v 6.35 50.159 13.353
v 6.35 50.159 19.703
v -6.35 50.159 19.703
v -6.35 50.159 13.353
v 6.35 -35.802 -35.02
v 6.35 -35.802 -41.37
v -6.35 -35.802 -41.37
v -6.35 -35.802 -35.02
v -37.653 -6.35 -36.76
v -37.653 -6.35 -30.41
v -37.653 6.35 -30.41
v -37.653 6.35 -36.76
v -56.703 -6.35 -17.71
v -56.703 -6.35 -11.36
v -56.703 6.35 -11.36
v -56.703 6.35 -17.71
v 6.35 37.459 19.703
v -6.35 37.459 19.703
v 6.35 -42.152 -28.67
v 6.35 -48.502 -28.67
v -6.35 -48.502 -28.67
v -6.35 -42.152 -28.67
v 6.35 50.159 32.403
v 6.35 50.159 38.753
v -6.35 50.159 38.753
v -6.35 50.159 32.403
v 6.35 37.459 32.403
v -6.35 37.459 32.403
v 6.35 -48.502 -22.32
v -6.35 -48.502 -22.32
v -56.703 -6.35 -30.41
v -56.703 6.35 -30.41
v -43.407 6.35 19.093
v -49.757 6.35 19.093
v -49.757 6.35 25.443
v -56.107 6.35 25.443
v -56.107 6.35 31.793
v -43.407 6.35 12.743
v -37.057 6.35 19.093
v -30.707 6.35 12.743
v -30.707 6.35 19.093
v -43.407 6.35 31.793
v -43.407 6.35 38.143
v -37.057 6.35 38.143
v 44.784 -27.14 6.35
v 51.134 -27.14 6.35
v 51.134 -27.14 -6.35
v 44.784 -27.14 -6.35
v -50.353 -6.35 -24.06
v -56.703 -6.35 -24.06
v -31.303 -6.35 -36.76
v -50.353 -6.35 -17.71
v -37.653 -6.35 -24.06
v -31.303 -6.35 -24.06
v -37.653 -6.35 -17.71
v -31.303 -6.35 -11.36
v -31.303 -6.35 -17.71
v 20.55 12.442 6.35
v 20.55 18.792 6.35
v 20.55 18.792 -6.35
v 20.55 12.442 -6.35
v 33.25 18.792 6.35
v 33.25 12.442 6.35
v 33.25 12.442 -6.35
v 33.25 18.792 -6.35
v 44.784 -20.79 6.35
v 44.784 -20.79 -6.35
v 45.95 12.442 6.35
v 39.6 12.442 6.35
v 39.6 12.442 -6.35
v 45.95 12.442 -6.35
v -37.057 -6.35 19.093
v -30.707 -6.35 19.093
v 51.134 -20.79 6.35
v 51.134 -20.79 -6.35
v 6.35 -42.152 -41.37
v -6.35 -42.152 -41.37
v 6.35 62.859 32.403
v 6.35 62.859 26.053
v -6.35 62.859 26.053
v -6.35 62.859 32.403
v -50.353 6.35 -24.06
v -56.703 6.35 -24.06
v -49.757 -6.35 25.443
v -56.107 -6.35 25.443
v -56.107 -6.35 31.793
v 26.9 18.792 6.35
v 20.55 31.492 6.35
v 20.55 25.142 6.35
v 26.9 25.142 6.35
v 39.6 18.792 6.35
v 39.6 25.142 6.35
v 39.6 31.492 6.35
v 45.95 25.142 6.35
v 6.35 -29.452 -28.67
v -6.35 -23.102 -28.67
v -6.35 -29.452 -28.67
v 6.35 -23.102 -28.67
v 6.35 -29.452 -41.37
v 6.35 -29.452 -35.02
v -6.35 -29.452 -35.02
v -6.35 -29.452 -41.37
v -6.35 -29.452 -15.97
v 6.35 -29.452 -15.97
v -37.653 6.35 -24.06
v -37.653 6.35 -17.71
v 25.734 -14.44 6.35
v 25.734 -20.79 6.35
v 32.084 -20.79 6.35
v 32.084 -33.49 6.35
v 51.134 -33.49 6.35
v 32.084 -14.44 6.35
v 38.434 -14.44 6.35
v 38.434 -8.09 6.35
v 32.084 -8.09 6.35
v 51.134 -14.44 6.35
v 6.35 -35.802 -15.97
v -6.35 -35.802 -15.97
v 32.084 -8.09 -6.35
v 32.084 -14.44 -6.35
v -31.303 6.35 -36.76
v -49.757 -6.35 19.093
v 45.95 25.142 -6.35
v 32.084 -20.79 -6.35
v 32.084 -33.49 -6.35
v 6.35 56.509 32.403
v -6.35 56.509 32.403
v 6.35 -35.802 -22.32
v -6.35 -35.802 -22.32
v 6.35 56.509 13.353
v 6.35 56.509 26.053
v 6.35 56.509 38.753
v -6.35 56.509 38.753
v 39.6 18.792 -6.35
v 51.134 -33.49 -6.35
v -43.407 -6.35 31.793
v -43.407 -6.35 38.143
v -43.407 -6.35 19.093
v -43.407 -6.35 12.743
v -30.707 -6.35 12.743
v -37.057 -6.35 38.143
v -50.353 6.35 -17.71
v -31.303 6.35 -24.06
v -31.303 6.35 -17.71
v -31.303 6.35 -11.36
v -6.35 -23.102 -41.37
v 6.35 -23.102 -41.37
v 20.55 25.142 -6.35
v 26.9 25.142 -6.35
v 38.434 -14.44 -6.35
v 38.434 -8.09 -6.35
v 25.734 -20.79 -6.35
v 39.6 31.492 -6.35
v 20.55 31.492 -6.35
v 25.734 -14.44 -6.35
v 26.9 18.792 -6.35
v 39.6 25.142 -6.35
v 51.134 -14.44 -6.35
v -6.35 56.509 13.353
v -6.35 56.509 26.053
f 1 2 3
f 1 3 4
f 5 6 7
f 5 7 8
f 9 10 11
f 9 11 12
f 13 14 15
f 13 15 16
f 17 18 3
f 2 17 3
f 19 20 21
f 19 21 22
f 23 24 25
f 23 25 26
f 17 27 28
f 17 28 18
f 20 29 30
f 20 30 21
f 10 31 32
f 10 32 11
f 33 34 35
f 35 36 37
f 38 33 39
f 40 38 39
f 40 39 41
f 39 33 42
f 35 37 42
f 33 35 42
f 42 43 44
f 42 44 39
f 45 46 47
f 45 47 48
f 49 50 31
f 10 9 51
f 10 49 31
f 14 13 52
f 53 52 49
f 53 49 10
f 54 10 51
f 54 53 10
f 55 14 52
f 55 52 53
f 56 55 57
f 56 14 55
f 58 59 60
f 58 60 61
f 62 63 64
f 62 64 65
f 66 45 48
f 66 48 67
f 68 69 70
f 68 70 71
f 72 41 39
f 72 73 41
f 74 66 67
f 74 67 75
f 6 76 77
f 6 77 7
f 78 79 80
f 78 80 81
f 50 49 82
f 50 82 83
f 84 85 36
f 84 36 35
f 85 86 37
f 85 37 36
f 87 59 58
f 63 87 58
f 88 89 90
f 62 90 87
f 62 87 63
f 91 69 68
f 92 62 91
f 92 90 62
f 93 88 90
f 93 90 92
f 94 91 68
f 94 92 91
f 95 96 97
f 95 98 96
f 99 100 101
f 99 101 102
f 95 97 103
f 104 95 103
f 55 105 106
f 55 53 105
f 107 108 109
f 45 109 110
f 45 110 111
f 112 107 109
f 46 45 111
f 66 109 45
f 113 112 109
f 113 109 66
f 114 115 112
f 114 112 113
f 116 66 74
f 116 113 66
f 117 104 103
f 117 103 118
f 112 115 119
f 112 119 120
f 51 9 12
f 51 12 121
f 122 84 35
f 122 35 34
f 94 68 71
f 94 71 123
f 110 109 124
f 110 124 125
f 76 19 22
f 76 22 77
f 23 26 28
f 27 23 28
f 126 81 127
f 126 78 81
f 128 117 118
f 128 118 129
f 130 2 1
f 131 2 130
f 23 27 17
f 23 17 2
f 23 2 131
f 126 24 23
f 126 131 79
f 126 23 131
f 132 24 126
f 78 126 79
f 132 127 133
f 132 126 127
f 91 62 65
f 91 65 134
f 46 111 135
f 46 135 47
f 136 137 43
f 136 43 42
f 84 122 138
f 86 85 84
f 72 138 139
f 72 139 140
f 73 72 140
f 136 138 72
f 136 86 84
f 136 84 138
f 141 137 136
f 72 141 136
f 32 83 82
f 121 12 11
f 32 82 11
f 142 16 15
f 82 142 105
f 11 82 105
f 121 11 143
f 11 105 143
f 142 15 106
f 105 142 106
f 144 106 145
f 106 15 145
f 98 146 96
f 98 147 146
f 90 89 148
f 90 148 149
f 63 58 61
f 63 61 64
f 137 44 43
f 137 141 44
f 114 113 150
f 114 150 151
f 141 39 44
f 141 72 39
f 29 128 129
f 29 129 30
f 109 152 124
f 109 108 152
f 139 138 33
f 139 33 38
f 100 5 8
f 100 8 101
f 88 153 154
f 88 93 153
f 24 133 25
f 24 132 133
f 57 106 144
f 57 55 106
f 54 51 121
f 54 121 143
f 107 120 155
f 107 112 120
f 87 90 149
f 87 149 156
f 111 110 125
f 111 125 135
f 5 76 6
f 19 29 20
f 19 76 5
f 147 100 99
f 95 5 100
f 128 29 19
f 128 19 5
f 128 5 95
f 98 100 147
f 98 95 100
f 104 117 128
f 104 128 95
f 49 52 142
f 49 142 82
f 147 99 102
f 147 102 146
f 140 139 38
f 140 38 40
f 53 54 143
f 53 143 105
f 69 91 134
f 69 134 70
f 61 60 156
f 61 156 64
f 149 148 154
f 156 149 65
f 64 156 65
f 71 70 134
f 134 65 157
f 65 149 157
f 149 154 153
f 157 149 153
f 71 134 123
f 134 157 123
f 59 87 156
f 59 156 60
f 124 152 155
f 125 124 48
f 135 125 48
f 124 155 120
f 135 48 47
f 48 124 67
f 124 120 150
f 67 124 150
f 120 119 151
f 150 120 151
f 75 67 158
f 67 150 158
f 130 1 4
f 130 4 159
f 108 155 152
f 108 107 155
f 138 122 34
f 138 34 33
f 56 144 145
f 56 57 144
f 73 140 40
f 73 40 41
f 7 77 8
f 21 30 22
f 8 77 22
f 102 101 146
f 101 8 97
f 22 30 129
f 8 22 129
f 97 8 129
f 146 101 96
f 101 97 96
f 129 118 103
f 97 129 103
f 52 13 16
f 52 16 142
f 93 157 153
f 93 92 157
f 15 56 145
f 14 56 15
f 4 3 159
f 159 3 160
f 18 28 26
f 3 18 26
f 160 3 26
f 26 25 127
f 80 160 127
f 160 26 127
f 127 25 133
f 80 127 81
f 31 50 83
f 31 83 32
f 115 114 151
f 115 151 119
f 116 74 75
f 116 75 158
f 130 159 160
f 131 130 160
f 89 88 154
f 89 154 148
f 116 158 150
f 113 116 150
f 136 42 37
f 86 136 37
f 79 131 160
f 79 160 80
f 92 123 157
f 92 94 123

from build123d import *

# Parameters (mm, degrees)
F1_DEPTH  = 6.35
F3_DEPTH  = 6.35
F5_DEPTH  = 6.35
F7_DEPTH  = 6.35
F9_DEPTH  = 6.35
F11_DEPTH = 6.35


with BuildPart() as f1:
    # F0 (on Front) → F1 (new body, symmetric)
    with BuildSketch(Plane.XZ):
        Polygon((-37.056787, 38.143132), (-43.406787, 38.143132), (-43.406787, 31.793132), (-56.106787, 31.793132), (-56.106787, 25.443132), (-49.756787, 25.443132), (-49.756787, 19.093132), (-43.406787, 19.093132), (-43.406787, 12.743132), (-30.706787, 12.743132), (-30.706787, 19.093132), (-37.056787, 19.093132), align=None)
    extrude(amount=F1_DEPTH, both=True)


with BuildPart() as f3:
    # F2 (on Top) → F3 (new body, symmetric)
    with BuildSketch(Plane.XY):
        Polygon((39.600315, 31.492337), (20.550315, 31.492337), (20.550315, 25.142337), (26.900315, 25.142337), (26.900315, 18.792337), (20.550315, 18.792337), (20.550315, 12.442337), (33.250316, 12.442337), (33.250316, 18.792337), (39.600316, 18.792337), (39.600316, 12.442337), (45.950315, 12.442337), (45.950315, 25.142337), (39.600315, 25.142337), align=None)
    extrude(amount=F3_DEPTH, both=True)


with BuildPart() as f5:
    # F4 (on Right) → F5 (new body, symmetric)
    with BuildSketch(Plane.YZ):
        Polygon((56.508505, 38.753134), (50.158505, 38.753134), (50.158505, 32.403134), (37.458505, 32.403134), (37.458505, 19.703134), (50.158505, 19.703134), (50.158505, 13.353134), (56.508505, 13.353134), (56.508505, 26.053134), (62.858505, 26.053134), (62.858505, 32.403134), (56.508505, 32.403134), align=None)
    extrude(amount=F5_DEPTH, both=True)


with BuildPart() as f7:
    # F6 (on Front) → F7 (new body, symmetric)
    with BuildSketch(Plane.XZ):
        Polygon((-31.302583, -17.709987), (-31.302583, -11.359987), (-56.702583, -11.359987), (-56.702583, -17.709987), (-50.352583, -17.709987), (-50.352583, -24.059987), (-56.702583, -24.059987), (-56.702583, -30.409987), (-37.652583, -30.409987), (-37.652583, -36.759987), (-31.302583, -36.759987), (-31.302583, -24.059987), (-37.652583, -24.059987), (-37.652583, -17.709987), align=None)
    extrude(amount=F7_DEPTH, both=True)


with BuildPart() as f9:
    # F8 (on Top) → F9 (new body, symmetric)
    with BuildSketch(Plane.XY):
        Polygon((25.733529, -20.789856), (32.083529, -20.789856), (32.083529, -33.489856), (51.133529, -33.489856), (51.133529, -27.139856), (44.783529, -27.139856), (44.783529, -20.789856), (51.133529, -20.789856), (51.133529, -14.439856), (38.433529, -14.439856), (38.433529, -8.089856), (32.083529, -8.089856), (32.083529, -14.439856), (25.733529, -14.439856), align=None)
    extrude(amount=F9_DEPTH, both=True)


with BuildPart() as f11:
    # F10 (on Right) → F11 (new body, symmetric)
    with BuildSketch(Plane.YZ):
        Polygon((-29.452352, -28.670423), (-29.452352, -15.970423), (-35.802352, -15.970423), (-35.802352, -22.320423), (-48.502352, -22.320423), (-48.502352, -28.670423), (-42.152352, -28.670423), (-42.152352, -41.370423), (-35.802352, -41.370423), (-35.802352, -35.020423), (-29.452352, -35.020423), (-29.452352, -41.370423), (-23.102352, -41.370423), (-23.102352, -28.670423), align=None)
    extrude(amount=F11_DEPTH, both=True)


solid = Compound([f1.part, f3.part, f5.part, f7.part, f9.part, f11.part])
